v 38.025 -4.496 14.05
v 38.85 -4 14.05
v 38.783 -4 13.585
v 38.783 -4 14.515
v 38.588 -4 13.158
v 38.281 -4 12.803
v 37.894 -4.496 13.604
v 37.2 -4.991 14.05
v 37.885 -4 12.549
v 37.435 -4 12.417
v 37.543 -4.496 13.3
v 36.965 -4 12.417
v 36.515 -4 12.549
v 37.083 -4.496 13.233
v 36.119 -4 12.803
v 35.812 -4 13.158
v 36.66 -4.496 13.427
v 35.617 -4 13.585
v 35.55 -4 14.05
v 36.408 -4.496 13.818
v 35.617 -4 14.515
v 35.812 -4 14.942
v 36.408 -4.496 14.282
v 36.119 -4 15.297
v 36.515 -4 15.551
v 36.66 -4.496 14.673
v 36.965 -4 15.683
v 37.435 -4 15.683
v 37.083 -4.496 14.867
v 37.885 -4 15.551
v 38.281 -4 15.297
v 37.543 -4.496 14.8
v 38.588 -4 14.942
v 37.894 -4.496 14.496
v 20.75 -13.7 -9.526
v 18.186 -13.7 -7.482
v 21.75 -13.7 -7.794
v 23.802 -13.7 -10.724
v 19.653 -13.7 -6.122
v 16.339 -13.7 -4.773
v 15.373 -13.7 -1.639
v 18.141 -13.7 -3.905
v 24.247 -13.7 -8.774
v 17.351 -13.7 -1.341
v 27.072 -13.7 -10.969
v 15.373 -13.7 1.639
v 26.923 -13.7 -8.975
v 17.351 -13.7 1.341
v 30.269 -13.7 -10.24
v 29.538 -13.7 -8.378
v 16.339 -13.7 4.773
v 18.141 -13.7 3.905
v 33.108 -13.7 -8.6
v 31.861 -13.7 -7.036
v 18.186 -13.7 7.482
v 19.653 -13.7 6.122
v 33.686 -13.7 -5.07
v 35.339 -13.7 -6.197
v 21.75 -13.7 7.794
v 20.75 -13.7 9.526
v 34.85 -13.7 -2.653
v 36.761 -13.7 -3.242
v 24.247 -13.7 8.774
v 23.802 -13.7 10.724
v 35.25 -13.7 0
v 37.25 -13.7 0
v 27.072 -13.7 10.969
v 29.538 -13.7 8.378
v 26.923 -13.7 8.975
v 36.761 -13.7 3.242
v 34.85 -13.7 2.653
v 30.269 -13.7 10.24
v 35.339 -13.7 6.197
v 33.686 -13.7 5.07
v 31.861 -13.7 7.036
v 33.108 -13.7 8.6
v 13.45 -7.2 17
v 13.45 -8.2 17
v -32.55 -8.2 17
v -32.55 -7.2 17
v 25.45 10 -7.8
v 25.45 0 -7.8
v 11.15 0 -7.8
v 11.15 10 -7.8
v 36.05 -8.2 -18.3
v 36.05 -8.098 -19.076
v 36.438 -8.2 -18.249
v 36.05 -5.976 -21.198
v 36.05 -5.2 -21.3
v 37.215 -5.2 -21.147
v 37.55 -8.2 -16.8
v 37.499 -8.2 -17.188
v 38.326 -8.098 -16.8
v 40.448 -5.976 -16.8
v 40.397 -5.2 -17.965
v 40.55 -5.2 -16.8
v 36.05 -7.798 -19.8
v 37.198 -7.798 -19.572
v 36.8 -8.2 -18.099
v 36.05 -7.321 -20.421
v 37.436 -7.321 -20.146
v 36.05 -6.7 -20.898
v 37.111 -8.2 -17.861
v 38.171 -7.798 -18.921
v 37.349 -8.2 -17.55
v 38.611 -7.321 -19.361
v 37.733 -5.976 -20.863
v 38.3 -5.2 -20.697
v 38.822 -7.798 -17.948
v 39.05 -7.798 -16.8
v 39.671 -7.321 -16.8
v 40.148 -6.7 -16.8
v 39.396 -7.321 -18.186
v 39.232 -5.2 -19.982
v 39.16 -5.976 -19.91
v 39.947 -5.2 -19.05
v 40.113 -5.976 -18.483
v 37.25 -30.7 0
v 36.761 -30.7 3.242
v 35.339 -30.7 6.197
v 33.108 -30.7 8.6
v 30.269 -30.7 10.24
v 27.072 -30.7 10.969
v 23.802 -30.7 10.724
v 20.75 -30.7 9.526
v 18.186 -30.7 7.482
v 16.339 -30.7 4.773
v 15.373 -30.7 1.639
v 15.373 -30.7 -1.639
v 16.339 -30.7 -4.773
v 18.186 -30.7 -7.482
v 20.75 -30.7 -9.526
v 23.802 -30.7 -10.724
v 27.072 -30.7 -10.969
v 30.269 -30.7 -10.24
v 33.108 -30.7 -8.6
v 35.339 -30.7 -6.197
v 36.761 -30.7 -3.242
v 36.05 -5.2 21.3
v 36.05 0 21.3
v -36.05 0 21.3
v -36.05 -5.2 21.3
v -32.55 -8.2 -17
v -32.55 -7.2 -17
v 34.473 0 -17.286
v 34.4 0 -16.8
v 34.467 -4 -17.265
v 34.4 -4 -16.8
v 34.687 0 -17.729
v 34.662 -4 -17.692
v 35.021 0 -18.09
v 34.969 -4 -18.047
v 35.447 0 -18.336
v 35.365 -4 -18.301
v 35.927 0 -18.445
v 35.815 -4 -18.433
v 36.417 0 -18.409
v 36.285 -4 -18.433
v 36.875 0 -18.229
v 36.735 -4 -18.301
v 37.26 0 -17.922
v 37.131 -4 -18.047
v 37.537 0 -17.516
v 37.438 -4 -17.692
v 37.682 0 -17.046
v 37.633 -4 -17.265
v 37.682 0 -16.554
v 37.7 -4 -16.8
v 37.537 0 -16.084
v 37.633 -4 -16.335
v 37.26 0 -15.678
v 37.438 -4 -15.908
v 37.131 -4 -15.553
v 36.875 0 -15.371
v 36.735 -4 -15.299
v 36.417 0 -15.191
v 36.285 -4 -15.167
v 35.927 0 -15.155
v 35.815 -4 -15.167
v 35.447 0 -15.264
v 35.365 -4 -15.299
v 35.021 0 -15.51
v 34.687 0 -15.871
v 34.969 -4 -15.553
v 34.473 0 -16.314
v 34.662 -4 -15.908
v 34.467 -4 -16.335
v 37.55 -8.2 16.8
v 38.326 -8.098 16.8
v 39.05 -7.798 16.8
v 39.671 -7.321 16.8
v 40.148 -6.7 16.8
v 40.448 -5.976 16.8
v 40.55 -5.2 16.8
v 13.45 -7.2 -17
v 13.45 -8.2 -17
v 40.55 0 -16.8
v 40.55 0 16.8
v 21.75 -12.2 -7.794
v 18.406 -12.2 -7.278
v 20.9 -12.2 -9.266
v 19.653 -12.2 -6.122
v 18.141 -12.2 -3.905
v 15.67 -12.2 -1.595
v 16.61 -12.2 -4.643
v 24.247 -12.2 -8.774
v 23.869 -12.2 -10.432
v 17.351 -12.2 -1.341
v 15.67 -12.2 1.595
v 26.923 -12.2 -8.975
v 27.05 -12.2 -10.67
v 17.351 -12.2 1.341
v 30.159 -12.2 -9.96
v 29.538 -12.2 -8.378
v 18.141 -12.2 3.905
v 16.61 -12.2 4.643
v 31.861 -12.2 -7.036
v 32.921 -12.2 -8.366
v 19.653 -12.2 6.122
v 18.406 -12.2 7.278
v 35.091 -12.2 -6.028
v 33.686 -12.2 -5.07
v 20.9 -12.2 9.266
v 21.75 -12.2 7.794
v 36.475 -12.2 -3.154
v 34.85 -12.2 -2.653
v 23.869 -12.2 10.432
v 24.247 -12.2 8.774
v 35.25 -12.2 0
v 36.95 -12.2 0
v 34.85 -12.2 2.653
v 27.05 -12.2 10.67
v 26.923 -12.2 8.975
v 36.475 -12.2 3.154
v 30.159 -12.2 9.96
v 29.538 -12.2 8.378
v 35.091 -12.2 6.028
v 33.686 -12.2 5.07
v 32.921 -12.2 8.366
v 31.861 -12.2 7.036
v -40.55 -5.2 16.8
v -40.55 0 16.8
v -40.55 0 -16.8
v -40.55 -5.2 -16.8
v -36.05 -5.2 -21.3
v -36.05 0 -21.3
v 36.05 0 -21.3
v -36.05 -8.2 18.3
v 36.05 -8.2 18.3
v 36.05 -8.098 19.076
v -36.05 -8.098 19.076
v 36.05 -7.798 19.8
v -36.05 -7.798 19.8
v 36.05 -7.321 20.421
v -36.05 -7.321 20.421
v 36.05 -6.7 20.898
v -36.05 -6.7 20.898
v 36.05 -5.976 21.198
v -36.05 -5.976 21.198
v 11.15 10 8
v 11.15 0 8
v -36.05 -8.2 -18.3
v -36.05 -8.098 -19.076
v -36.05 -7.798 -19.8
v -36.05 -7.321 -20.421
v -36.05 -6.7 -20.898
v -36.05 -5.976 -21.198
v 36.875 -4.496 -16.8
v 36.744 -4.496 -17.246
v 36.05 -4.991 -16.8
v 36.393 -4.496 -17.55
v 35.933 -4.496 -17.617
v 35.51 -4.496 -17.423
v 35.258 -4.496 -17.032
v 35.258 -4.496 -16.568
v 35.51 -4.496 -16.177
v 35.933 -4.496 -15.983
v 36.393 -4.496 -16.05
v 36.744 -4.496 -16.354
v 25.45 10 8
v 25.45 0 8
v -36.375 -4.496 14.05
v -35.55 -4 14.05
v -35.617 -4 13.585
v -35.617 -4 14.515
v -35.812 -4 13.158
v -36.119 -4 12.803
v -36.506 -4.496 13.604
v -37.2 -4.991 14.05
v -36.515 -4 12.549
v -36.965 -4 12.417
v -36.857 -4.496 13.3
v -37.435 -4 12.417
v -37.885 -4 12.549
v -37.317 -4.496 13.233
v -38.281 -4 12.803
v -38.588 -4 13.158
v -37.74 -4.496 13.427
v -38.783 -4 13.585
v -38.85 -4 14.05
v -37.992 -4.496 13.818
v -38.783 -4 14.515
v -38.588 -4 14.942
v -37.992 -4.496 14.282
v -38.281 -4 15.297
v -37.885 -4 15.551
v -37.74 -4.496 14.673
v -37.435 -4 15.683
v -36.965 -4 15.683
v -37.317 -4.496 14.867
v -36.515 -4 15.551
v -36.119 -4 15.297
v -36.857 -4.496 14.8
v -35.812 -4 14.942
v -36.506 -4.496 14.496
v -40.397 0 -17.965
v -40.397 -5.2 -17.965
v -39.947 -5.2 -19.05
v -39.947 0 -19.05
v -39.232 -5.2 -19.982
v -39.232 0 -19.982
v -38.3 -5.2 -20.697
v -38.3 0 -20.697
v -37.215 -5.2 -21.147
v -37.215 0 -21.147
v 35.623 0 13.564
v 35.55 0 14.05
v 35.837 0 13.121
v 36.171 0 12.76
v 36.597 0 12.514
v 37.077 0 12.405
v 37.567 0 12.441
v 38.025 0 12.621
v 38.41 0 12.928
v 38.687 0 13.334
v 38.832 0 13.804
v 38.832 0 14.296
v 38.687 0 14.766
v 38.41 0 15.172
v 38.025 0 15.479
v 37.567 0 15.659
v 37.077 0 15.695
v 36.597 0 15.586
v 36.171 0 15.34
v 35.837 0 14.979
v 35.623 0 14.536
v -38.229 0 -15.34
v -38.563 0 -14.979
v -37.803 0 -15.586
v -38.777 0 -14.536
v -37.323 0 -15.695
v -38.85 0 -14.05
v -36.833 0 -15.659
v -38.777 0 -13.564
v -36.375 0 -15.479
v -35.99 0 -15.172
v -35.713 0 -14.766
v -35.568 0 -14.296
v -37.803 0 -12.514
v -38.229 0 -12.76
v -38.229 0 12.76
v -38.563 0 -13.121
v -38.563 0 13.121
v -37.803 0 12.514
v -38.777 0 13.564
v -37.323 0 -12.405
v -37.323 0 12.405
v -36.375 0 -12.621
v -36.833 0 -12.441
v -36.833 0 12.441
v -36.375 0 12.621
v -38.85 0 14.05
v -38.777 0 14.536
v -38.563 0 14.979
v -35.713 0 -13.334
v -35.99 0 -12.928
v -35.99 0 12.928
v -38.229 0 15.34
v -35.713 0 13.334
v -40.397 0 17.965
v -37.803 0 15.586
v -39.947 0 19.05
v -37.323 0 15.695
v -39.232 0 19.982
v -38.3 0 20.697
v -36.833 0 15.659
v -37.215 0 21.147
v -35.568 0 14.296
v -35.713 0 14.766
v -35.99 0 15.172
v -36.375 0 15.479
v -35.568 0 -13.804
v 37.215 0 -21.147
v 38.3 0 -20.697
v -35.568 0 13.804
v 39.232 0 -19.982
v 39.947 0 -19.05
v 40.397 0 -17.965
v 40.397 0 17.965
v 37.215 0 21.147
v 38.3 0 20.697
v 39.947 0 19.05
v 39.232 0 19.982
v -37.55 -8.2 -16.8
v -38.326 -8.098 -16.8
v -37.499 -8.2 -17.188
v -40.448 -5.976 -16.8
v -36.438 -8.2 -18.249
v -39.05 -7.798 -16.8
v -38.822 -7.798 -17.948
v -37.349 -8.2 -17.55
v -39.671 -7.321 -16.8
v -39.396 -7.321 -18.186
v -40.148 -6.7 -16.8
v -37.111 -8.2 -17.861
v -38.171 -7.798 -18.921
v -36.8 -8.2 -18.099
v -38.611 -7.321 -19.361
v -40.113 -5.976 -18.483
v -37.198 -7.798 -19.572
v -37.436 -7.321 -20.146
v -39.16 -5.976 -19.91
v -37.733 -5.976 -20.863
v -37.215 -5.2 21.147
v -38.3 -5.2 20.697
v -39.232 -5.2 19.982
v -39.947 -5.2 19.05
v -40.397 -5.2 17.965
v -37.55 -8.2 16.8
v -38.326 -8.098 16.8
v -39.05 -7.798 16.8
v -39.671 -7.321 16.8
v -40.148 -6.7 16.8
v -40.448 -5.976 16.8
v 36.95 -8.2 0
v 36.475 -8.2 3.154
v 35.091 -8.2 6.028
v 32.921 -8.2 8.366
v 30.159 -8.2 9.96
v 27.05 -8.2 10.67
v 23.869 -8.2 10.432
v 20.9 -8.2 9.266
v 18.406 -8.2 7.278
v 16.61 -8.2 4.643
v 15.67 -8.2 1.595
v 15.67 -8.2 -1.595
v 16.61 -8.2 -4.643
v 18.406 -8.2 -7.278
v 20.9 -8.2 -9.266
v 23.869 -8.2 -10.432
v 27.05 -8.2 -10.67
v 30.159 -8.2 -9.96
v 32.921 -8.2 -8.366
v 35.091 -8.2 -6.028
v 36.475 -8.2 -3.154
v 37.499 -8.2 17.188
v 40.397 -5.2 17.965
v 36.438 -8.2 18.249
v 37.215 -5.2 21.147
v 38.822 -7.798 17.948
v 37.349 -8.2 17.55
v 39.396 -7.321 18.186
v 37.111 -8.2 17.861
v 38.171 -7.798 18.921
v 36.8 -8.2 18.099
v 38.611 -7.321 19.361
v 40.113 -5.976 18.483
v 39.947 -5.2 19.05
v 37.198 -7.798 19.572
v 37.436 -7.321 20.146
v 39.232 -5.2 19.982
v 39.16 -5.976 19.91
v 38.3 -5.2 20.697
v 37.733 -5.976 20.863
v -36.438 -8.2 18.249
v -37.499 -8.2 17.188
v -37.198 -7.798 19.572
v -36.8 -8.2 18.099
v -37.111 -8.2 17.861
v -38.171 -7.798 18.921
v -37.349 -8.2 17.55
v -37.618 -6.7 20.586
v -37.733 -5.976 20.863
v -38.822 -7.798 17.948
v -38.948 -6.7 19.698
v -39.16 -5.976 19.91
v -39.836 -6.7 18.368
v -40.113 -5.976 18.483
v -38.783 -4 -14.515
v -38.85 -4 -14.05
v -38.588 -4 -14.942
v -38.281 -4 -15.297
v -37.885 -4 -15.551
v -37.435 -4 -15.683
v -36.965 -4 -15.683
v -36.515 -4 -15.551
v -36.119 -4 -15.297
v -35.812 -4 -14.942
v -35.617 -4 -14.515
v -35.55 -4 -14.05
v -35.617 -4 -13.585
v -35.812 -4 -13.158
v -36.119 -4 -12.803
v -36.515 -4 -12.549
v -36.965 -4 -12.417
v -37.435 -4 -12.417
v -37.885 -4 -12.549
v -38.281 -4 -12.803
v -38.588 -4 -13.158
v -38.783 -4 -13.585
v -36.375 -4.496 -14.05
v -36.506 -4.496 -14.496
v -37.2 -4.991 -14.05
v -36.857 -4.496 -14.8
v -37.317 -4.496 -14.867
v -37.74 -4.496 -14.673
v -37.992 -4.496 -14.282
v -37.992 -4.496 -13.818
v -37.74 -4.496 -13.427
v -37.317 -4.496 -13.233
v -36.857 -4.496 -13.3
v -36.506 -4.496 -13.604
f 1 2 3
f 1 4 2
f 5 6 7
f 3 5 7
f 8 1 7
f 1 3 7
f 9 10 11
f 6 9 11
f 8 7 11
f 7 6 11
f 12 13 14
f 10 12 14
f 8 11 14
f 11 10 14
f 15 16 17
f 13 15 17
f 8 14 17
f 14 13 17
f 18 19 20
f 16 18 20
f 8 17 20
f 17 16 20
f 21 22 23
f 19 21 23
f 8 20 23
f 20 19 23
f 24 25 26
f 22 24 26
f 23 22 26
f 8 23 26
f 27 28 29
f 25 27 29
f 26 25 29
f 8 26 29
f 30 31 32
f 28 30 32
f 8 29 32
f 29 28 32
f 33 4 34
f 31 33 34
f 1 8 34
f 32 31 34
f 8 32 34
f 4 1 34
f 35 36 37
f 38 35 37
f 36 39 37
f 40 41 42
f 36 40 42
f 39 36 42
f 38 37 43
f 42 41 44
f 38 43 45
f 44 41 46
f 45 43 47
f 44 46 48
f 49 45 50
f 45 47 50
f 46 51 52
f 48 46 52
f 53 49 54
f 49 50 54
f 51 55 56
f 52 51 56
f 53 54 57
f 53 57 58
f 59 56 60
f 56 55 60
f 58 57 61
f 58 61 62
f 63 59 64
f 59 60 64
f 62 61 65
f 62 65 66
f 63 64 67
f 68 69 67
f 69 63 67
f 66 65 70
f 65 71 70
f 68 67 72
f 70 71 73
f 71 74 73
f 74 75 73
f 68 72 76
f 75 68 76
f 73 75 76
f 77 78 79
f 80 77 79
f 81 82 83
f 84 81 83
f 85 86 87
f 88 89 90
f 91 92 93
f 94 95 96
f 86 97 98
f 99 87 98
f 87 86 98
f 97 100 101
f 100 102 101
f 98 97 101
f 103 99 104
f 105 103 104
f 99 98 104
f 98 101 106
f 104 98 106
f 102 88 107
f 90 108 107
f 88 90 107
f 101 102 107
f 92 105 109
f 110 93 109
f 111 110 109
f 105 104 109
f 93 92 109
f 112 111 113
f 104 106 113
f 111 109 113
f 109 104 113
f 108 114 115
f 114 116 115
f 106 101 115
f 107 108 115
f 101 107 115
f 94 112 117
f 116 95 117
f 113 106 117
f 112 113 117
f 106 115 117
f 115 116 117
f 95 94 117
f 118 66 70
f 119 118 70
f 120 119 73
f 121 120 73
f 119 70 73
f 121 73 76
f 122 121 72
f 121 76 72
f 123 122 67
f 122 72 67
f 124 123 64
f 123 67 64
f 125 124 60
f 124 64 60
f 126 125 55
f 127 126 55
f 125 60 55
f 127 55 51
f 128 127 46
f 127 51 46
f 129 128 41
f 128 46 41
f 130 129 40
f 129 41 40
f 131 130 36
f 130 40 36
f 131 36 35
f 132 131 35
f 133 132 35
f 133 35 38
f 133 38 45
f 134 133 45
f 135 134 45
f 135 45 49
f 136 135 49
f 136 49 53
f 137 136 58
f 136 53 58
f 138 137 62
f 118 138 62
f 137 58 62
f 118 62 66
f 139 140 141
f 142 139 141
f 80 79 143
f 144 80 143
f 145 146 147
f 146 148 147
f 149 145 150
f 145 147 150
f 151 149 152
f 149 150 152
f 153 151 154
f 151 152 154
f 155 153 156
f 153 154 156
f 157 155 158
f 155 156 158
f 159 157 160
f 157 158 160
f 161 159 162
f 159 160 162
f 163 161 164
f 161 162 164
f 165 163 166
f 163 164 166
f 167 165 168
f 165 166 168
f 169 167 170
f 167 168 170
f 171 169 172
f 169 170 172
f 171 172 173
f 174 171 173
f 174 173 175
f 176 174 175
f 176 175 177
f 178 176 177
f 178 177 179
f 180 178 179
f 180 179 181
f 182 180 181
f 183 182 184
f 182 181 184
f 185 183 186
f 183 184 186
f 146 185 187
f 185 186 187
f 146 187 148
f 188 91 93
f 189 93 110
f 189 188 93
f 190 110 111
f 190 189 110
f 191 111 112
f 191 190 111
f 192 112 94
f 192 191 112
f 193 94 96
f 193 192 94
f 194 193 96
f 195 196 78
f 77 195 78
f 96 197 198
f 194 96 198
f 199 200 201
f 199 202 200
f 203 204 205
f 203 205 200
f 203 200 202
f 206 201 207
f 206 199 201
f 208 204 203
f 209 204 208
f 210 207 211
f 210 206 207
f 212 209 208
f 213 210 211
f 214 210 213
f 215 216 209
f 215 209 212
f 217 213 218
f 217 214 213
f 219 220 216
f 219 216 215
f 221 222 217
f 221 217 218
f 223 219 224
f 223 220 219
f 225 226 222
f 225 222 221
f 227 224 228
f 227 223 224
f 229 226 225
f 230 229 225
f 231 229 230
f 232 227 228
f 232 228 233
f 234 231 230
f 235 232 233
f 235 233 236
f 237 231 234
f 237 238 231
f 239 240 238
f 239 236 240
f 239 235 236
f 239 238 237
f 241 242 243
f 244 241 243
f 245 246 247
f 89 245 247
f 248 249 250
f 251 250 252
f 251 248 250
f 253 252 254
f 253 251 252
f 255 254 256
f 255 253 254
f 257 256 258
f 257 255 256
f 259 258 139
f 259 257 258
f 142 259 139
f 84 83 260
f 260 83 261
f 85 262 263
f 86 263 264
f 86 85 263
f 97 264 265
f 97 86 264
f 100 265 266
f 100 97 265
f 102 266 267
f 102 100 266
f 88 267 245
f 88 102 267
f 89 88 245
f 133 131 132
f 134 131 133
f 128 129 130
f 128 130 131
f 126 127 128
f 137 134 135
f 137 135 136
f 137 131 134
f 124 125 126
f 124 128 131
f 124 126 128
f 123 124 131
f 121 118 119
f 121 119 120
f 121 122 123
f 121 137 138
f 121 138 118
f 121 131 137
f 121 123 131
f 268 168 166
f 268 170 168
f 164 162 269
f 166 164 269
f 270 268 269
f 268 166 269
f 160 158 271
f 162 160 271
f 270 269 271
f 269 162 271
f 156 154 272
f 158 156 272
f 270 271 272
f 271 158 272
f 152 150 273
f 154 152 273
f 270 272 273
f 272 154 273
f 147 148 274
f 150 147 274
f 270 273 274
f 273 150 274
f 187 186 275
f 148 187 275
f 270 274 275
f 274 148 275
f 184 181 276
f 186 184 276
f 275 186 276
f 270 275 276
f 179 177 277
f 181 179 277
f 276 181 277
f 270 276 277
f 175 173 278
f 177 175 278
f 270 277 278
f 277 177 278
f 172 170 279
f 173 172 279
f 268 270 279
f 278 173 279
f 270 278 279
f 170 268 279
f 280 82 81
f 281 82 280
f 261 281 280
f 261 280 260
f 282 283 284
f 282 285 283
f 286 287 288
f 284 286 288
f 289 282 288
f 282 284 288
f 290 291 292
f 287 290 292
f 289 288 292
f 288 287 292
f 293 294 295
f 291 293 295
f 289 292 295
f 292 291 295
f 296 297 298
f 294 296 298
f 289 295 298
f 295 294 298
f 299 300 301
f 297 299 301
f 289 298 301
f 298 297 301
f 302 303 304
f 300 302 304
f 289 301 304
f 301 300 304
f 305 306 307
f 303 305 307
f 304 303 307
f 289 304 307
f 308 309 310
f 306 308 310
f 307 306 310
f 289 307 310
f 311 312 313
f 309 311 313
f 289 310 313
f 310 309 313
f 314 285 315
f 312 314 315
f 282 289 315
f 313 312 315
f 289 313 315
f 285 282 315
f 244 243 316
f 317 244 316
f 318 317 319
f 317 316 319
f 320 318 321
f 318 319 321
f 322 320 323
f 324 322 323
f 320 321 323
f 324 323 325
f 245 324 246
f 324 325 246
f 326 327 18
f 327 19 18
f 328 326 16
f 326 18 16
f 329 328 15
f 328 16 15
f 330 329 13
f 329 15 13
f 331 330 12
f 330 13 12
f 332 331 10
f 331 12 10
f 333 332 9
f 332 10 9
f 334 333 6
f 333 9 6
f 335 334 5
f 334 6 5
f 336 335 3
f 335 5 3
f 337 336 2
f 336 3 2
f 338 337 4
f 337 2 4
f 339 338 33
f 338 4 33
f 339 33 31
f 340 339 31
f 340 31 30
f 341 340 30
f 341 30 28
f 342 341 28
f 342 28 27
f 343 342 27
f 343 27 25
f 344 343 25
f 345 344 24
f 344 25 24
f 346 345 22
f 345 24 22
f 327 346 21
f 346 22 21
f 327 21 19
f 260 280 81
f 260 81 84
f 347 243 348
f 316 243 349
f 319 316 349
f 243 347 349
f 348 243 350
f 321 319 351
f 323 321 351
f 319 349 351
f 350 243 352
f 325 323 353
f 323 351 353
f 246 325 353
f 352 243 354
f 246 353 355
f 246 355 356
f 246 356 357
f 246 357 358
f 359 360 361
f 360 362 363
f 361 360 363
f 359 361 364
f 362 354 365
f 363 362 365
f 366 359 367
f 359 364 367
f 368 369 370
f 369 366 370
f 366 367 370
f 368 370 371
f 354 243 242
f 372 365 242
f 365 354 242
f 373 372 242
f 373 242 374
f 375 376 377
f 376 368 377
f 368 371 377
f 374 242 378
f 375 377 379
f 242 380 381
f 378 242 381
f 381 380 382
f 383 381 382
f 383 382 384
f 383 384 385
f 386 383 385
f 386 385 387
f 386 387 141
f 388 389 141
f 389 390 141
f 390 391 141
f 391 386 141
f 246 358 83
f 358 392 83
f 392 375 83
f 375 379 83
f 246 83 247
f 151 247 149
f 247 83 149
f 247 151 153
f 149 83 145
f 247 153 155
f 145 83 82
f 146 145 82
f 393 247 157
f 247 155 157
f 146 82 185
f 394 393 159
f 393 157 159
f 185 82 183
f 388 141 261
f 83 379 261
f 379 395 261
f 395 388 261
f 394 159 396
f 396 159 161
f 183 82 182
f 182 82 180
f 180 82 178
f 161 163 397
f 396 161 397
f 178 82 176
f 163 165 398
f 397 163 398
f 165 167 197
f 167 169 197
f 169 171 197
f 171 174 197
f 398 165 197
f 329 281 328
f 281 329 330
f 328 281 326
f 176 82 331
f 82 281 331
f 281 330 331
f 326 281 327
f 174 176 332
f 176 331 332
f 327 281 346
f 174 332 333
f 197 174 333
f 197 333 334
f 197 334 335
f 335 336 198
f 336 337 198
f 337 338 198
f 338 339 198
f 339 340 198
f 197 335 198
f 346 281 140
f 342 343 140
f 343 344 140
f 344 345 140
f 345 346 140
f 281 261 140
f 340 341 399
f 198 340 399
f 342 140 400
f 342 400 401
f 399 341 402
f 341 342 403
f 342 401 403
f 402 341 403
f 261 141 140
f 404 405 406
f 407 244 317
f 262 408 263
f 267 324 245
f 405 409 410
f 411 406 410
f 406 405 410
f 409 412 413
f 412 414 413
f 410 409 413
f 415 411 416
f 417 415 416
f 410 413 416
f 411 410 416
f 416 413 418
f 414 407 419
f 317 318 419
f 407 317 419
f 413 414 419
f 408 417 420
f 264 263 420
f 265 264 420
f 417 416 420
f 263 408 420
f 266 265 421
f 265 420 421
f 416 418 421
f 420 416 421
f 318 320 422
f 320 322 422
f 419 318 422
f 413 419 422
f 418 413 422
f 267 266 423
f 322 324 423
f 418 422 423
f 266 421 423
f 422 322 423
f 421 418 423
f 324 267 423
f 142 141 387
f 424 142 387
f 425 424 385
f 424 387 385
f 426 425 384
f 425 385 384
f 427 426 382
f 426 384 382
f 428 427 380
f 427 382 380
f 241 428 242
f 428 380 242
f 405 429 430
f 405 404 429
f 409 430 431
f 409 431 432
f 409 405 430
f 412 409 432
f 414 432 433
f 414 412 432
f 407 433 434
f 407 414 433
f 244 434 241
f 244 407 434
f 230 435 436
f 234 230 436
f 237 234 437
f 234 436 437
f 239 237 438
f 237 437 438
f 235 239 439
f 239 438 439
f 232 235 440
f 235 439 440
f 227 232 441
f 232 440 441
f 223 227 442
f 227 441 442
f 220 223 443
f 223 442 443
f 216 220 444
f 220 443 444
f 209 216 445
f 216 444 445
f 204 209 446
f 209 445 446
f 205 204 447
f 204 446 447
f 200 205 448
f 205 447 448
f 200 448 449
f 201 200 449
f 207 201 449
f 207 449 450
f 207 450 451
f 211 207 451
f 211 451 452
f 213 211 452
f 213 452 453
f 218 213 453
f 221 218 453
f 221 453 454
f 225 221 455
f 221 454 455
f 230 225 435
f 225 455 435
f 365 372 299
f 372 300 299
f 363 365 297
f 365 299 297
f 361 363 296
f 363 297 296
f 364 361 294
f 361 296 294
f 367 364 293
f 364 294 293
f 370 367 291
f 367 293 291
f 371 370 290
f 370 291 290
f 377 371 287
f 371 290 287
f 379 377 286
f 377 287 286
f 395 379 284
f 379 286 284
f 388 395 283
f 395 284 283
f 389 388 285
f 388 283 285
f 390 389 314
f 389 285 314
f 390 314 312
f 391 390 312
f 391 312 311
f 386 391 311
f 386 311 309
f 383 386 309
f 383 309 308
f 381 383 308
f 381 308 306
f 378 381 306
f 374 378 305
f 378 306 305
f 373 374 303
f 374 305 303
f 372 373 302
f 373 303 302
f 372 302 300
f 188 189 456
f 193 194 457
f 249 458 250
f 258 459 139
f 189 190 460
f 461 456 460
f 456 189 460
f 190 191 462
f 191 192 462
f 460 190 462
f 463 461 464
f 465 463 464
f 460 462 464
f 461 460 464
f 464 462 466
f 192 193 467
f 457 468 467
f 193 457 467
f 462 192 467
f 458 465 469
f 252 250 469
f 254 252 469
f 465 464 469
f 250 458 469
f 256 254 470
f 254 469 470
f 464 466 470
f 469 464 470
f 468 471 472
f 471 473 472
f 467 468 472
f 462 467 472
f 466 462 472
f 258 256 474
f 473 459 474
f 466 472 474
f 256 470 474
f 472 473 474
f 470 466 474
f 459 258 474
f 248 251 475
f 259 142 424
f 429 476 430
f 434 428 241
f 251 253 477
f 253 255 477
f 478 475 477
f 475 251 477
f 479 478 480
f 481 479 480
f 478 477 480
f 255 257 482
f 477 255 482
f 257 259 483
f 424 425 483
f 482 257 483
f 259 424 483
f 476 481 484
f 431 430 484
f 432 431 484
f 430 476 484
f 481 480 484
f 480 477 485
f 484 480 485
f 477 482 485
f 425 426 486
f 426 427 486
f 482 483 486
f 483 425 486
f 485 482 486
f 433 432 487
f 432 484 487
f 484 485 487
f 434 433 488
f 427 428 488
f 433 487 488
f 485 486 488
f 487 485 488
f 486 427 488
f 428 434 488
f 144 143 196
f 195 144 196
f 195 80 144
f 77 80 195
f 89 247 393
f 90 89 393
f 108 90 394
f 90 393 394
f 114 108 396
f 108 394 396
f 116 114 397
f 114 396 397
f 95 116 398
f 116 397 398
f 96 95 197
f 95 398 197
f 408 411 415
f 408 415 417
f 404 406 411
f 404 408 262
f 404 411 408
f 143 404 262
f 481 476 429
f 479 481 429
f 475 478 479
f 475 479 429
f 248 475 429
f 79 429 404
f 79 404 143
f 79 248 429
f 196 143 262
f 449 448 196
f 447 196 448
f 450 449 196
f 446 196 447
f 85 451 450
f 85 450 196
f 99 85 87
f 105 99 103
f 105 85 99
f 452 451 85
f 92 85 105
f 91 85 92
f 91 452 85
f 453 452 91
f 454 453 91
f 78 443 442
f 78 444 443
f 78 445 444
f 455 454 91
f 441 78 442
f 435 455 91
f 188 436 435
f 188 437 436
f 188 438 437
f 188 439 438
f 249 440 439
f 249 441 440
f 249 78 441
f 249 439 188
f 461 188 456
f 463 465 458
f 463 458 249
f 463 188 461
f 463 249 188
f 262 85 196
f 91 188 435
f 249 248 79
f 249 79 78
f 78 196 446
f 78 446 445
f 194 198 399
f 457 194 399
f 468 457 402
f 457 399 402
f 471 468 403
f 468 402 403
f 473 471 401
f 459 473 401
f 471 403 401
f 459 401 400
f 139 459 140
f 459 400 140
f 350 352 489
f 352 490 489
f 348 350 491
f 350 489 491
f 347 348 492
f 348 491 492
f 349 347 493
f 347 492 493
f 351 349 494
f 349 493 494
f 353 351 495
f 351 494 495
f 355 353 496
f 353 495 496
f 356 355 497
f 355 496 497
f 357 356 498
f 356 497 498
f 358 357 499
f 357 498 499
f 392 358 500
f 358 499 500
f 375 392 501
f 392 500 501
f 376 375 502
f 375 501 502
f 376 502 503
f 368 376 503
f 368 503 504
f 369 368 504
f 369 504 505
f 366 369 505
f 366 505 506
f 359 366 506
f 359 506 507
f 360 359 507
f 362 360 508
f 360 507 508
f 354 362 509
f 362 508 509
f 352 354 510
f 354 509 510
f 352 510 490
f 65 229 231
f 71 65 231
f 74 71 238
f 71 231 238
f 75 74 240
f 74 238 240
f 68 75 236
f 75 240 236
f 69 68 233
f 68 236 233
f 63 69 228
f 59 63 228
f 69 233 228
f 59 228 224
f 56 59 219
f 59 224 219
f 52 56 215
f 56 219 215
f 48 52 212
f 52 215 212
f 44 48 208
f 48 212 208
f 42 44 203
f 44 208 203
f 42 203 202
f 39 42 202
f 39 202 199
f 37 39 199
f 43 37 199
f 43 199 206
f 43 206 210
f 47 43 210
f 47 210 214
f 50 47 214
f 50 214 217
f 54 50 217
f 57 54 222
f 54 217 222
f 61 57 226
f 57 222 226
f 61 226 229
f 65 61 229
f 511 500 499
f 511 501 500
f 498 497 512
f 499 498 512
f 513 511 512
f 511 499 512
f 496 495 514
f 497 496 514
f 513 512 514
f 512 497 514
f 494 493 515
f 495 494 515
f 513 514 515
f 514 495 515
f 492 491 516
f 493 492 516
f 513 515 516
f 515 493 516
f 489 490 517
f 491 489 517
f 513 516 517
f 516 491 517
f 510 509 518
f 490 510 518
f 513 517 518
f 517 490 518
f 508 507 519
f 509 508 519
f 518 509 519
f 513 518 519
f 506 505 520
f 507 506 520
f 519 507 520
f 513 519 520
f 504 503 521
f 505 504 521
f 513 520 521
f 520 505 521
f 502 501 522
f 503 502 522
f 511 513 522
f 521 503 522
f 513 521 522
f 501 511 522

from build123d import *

# Parameters (mm, degrees)
F1_DEPTH  = 8.2
F2_W      = 14.3
F2_H      = 15.8
F3_DEPTH  = 10
F4_R      = 10.7
F5_DEPTH  = 4
F7_DEPTH  = 1
F8_R      = 3
F9_D      = 3.3
F9_DEPTH  = 4
F9_TIP    = 0.9914200214
F10_R     = 9
F11_DEPTH = 1.5
F12_R     = 11
F12_R_2   = 9
F13_DEPTH = 17


with BuildPart() as f1:
    # F0 (on Front) → F1 (new body)
    with BuildSketch(Plane.XZ):
        with BuildLine():
            ThreePointArc((40.55, 16.8), (39.2319805153, 19.9819805153), (36.05, 21.3))
            Line((36.05, 21.3), (-36.05, 21.3))
            ThreePointArc((-36.05, 21.3), (-39.2319805153, 19.9819805153), (-40.55, 16.8))
            Line((-40.55, 16.8), (-40.55, -16.8))
            ThreePointArc((-40.55, -16.8), (-39.2319805153, -19.9819805153), (-36.05, -21.3))
            Line((-36.05, -21.3), (36.05, -21.3))
            ThreePointArc((36.05, -21.3), (39.2319805153, -19.9819805153), (40.55, -16.8))
            Line((40.55, -16.8), (40.55, 16.8))
        make_face()
    extrude(amount=F1_DEPTH)

    # F2 (on face) → F3 (join)
    with BuildSketch(Plane(origin=(0, 0, 0), x_dir=(-1, 0, 0), z_dir=(0, 1, 0))):
        with Locations((-18.3, 0.1)):
            Rectangle(F2_W, F2_H)
    extrude(amount=F3_DEPTH)

    # F4 (on face) → F5 (join)
    with BuildSketch(Plane.XZ.offset(8.2)):
        with Locations((26.25, 0)):
            Circle(F4_R)
    extrude(amount=F5_DEPTH)

    # F6 (on face) → F7 (cut)
    with BuildSketch(Plane.XZ.offset(8.2)):
        Polygon((-32.55, 0), (-32.55, -17), (13.45, -17), (13.45, 17), (-32.55, 17), align=None)
    extrude(amount=-F7_DEPTH, mode=Mode.SUBTRACT)

    # F8
    f8_edges = [f1.edges().sort_by_distance(p)[0] for p in [
        (-40.55, -8.2, 0),
        (-39.231981, -8.2, -19.981981),
        (40.55, -8.2, 0),
    ]]
    fillet(f8_edges, radius=F8_R)

    # F9
    with Locations(Plane(origin=(0, 0, 0), x_dir=(1, 0, 0), z_dir=(0, 1, 0))):
        with Locations((37.2, -14.05), (36.05, 16.8), (-37.2, 14.05), (-37.2, -14.05)):
            Hole(F9_D / 2, depth=F9_DEPTH)
            with Locations((0, 0, -(F9_DEPTH + F9_TIP / 2))):  # 118° drill point
                Cone(0, F9_D / 2, F9_TIP, mode=Mode.SUBTRACT)

    # F10 (on face) → F11 (join)
    with BuildSketch(Plane.XZ.offset(12.2)):
        with Locations((26.25, 0)):
            Circle(F10_R)
    extrude(amount=F11_DEPTH)

    # F12 (on face) → F13 (join)
    with BuildSketch(Plane.XZ.offset(13.7)):
        with Locations((26.25, 0)):
            Circle(F12_R)
        with Locations((26.25, 0)):
            Circle(F12_R_2, mode=Mode.SUBTRACT)
        with Locations((26.25, 0)):
            Circle(F12_R_2)
    extrude(amount=F13_DEPTH)


solid = f1.part
